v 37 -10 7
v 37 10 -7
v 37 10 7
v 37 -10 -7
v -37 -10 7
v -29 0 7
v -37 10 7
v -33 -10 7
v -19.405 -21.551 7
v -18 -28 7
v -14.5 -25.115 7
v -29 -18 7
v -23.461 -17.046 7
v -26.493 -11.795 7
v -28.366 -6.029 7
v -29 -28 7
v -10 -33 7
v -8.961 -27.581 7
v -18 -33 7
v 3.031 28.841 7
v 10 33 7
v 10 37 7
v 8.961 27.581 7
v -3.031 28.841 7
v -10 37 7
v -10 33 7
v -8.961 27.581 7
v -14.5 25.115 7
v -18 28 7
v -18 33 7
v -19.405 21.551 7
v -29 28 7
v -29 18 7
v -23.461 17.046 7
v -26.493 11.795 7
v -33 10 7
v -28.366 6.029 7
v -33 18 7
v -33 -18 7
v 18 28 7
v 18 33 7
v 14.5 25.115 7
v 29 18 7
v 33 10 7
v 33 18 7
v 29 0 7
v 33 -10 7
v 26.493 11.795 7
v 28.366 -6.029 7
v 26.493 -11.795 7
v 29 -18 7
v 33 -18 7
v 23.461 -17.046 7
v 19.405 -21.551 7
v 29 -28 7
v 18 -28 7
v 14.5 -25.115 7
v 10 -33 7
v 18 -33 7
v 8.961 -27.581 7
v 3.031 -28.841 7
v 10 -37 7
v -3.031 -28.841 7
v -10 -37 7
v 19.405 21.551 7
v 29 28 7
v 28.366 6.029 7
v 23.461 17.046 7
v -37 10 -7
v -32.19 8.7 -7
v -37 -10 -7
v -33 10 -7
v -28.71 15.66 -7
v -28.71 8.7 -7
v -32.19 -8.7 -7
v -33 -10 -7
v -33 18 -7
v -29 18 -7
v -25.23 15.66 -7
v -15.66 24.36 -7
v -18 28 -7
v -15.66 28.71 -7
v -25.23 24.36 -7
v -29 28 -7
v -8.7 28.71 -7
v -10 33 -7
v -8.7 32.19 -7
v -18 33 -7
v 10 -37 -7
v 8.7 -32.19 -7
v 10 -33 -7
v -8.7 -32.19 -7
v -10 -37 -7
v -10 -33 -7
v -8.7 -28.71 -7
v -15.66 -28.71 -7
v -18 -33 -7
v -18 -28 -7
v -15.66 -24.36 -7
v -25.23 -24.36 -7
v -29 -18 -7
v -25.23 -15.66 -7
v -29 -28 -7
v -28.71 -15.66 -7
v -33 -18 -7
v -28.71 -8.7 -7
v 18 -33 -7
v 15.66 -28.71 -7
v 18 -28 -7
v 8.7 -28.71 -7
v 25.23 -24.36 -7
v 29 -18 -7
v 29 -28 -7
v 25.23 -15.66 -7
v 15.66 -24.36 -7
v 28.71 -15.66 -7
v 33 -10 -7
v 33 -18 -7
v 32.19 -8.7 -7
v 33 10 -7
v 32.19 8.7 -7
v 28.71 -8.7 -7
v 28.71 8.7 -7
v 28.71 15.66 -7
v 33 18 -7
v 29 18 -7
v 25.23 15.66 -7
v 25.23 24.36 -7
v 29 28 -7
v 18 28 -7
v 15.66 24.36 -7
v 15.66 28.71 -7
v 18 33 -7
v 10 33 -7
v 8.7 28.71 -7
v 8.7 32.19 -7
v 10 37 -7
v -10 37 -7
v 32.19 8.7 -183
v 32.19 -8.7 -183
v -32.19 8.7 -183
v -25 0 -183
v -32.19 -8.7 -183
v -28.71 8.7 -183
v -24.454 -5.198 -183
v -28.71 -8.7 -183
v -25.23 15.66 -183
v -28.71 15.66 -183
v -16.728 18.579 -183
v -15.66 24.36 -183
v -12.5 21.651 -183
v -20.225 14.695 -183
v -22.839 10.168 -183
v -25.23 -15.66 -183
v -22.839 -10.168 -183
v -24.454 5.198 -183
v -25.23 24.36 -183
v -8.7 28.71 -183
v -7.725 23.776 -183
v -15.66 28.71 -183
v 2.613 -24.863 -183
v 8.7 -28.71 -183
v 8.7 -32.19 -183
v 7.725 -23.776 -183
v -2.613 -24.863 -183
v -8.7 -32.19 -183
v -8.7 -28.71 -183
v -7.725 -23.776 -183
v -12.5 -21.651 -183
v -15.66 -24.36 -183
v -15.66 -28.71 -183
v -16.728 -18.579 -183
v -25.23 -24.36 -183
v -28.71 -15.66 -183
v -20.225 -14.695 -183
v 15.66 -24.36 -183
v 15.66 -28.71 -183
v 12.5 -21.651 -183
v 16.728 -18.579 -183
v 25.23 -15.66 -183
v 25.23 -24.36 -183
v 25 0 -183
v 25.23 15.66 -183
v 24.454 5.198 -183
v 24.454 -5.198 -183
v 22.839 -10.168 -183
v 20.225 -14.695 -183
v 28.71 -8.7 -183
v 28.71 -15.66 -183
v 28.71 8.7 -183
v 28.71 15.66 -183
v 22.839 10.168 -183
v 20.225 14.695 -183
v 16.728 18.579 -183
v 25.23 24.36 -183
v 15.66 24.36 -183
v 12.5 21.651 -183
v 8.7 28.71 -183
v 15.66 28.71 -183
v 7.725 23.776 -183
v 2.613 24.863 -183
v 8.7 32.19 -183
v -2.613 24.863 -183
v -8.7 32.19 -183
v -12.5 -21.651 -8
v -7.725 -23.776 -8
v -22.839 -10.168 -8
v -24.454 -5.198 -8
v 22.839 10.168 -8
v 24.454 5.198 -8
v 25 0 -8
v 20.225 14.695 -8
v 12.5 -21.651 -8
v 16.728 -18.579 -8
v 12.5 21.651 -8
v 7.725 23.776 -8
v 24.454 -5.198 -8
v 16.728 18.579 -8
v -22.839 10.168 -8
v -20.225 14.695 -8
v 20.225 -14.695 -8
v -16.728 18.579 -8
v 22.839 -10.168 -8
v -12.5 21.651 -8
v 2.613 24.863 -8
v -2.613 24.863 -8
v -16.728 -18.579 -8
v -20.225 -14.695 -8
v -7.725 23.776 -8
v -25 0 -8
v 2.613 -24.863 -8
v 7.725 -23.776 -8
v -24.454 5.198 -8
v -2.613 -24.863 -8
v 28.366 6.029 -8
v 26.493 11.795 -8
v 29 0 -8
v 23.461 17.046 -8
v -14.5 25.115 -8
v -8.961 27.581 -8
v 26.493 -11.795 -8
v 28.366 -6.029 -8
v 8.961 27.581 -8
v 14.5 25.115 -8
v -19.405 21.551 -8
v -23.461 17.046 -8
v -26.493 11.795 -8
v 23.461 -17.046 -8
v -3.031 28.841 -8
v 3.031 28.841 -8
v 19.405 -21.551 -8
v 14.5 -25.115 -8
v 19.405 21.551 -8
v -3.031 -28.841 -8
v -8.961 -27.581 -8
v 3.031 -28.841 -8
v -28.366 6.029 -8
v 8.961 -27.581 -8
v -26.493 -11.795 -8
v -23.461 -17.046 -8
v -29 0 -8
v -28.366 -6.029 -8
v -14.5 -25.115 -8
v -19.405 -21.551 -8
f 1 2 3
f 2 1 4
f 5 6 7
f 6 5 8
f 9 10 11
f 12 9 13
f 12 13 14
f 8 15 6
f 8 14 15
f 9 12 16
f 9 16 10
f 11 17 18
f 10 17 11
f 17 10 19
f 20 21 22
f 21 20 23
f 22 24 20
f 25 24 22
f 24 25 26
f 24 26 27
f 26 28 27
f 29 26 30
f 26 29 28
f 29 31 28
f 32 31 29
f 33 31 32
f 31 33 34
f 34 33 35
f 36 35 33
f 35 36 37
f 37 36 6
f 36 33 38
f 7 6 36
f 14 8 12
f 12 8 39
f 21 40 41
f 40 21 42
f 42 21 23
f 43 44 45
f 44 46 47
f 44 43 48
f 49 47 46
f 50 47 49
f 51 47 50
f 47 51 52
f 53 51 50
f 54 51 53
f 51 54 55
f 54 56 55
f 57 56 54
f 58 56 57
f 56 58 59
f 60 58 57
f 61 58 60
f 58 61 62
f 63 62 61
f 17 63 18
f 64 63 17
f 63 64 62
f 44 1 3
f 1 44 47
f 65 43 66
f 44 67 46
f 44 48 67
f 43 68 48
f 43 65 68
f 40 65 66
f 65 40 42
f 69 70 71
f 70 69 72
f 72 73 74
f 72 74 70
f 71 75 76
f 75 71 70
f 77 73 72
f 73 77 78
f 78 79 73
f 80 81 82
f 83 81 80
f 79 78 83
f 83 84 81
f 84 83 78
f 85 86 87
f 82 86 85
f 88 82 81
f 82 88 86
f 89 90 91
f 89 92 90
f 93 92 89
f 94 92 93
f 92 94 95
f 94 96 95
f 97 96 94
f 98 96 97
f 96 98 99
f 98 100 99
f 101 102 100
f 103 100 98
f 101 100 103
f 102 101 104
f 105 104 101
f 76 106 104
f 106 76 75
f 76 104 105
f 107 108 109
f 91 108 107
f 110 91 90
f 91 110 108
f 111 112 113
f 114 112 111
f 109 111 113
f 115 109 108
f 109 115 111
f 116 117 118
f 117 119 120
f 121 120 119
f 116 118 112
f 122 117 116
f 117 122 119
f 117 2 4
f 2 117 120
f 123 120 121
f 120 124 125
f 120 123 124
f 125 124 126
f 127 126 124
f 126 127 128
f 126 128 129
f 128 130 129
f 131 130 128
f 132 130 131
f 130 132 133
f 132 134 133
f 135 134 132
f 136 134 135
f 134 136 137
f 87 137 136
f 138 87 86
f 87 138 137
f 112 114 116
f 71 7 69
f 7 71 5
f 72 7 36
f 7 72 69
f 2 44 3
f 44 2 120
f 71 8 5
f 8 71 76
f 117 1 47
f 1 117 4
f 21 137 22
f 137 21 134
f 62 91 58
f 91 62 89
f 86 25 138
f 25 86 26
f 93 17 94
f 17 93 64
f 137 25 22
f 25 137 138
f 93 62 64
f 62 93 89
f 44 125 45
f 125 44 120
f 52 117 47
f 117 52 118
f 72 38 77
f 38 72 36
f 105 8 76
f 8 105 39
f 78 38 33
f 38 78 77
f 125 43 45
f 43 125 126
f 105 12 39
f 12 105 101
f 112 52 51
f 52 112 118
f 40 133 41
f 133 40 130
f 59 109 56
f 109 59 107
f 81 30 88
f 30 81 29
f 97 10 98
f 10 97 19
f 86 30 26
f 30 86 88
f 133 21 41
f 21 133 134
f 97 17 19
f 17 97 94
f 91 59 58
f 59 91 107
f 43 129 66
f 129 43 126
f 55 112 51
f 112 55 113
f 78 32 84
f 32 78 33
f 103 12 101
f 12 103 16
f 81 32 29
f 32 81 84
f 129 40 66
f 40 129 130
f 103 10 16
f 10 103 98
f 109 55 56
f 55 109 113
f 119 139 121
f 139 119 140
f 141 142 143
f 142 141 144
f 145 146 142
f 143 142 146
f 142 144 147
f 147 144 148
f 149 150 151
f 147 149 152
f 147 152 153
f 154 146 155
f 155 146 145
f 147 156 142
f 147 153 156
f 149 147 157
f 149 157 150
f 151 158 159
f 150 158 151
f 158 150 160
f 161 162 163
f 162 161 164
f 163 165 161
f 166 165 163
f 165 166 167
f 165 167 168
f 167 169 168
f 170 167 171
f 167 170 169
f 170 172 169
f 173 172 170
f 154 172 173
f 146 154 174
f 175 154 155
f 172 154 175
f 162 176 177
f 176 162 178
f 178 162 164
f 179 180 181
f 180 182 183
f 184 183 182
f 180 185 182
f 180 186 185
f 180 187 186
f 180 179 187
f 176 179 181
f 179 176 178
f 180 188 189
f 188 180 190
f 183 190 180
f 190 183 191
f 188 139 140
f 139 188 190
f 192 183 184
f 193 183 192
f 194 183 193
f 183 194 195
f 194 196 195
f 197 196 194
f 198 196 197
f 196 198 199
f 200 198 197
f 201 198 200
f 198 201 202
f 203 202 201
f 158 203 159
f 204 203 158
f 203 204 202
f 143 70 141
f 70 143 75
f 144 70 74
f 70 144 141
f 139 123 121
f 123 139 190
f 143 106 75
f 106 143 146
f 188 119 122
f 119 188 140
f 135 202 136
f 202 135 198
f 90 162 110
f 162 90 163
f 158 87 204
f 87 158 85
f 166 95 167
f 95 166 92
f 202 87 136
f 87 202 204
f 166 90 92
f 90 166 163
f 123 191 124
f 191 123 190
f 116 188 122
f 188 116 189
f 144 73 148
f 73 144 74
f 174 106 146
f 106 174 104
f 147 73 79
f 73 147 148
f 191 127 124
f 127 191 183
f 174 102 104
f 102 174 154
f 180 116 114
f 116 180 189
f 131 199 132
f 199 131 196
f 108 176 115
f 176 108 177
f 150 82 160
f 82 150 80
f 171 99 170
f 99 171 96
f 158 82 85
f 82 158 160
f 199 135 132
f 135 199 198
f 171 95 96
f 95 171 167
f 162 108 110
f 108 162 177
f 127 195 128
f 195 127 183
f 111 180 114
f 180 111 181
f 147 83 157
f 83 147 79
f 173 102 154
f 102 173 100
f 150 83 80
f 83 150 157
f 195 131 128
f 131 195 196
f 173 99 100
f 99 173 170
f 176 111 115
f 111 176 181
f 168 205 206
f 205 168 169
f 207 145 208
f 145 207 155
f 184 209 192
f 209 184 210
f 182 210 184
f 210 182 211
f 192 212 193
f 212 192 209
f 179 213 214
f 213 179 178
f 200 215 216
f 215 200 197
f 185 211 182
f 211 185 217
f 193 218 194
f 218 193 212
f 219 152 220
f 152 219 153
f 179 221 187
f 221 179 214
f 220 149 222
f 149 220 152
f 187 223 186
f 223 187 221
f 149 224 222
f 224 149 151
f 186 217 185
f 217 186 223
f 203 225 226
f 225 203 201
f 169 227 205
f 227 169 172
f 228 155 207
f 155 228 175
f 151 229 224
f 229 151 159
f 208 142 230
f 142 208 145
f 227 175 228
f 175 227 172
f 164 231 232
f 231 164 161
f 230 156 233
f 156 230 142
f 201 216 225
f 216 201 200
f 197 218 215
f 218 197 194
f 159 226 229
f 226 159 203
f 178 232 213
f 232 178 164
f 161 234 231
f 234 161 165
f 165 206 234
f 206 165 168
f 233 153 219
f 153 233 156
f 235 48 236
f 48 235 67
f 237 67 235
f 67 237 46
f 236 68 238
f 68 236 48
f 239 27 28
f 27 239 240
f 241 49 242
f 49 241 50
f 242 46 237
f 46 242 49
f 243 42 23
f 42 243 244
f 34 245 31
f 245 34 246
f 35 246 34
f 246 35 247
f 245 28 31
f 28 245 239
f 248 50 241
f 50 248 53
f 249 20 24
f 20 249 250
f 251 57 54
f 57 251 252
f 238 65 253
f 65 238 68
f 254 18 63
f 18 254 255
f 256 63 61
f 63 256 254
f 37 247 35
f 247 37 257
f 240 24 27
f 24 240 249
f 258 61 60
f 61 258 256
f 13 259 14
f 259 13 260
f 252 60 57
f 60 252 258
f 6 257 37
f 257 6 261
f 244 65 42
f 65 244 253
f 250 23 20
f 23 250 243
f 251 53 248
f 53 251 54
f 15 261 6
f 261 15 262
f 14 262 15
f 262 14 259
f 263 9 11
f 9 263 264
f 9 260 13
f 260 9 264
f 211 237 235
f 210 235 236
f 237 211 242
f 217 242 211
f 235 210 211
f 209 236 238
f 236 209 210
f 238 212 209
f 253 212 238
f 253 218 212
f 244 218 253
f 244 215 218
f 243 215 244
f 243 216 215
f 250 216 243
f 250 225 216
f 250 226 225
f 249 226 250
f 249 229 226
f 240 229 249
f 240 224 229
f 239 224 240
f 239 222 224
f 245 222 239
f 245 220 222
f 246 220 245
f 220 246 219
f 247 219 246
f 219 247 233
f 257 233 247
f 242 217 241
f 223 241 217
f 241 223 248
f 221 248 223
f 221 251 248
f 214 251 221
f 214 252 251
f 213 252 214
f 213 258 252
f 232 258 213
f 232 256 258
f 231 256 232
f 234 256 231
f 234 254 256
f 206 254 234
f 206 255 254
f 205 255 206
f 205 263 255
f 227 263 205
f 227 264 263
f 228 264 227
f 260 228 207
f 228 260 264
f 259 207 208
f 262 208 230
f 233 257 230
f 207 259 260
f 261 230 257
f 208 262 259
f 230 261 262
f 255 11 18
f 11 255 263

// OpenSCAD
//translate([0,0,6])
//	rotate([180,0,45])
//8		import("/home/jklein/objects/smb3pipe_part1-2.stl");
//translate([0,30,-.5])
//	cube([13,13,13],center=true);
difference(){
	union(){
		color("green") 
			pipe(74,14); // lip
		color("green") 
			translate([0,0,-93])
				scale([.87,.87,1])
					pipe(74,180); // shaft
	}
	translate([0,0,-12])
		cutout();
//translate([50,0,0]) cube([100,100,150],center=true);
}

module pipe(width,heigth){
	 
	cube([width,20,heigth],center=true);	// 20
	cube([20,width,heigth],center=true);
	
	cube([width-8,36,heigth],center=true); // 28
	cube([36,width-8,heigth],center=true);
	
//	cube([width-8,36,heigth],center=true); // 36
//	cube([36,width-8,heigth],center=true);

	cube([width-16,56,heigth],center=true); // 44
//	cube([52width-20,heigth],center=true);

//	cube([width-16,50,heigth],center=true); // 50
//	cube([50,width-16,heigth],center=true);

//	cube([width-20,54,heigth],center=true); //54
//	cube([52,width-20,heigth],center=true);
	
}


module cutout(){
	cylinder(d=50,h=414,center=true); // small
	translate([0,0,12])
		cylinder(d=58,h=16,center=true); // big
}
